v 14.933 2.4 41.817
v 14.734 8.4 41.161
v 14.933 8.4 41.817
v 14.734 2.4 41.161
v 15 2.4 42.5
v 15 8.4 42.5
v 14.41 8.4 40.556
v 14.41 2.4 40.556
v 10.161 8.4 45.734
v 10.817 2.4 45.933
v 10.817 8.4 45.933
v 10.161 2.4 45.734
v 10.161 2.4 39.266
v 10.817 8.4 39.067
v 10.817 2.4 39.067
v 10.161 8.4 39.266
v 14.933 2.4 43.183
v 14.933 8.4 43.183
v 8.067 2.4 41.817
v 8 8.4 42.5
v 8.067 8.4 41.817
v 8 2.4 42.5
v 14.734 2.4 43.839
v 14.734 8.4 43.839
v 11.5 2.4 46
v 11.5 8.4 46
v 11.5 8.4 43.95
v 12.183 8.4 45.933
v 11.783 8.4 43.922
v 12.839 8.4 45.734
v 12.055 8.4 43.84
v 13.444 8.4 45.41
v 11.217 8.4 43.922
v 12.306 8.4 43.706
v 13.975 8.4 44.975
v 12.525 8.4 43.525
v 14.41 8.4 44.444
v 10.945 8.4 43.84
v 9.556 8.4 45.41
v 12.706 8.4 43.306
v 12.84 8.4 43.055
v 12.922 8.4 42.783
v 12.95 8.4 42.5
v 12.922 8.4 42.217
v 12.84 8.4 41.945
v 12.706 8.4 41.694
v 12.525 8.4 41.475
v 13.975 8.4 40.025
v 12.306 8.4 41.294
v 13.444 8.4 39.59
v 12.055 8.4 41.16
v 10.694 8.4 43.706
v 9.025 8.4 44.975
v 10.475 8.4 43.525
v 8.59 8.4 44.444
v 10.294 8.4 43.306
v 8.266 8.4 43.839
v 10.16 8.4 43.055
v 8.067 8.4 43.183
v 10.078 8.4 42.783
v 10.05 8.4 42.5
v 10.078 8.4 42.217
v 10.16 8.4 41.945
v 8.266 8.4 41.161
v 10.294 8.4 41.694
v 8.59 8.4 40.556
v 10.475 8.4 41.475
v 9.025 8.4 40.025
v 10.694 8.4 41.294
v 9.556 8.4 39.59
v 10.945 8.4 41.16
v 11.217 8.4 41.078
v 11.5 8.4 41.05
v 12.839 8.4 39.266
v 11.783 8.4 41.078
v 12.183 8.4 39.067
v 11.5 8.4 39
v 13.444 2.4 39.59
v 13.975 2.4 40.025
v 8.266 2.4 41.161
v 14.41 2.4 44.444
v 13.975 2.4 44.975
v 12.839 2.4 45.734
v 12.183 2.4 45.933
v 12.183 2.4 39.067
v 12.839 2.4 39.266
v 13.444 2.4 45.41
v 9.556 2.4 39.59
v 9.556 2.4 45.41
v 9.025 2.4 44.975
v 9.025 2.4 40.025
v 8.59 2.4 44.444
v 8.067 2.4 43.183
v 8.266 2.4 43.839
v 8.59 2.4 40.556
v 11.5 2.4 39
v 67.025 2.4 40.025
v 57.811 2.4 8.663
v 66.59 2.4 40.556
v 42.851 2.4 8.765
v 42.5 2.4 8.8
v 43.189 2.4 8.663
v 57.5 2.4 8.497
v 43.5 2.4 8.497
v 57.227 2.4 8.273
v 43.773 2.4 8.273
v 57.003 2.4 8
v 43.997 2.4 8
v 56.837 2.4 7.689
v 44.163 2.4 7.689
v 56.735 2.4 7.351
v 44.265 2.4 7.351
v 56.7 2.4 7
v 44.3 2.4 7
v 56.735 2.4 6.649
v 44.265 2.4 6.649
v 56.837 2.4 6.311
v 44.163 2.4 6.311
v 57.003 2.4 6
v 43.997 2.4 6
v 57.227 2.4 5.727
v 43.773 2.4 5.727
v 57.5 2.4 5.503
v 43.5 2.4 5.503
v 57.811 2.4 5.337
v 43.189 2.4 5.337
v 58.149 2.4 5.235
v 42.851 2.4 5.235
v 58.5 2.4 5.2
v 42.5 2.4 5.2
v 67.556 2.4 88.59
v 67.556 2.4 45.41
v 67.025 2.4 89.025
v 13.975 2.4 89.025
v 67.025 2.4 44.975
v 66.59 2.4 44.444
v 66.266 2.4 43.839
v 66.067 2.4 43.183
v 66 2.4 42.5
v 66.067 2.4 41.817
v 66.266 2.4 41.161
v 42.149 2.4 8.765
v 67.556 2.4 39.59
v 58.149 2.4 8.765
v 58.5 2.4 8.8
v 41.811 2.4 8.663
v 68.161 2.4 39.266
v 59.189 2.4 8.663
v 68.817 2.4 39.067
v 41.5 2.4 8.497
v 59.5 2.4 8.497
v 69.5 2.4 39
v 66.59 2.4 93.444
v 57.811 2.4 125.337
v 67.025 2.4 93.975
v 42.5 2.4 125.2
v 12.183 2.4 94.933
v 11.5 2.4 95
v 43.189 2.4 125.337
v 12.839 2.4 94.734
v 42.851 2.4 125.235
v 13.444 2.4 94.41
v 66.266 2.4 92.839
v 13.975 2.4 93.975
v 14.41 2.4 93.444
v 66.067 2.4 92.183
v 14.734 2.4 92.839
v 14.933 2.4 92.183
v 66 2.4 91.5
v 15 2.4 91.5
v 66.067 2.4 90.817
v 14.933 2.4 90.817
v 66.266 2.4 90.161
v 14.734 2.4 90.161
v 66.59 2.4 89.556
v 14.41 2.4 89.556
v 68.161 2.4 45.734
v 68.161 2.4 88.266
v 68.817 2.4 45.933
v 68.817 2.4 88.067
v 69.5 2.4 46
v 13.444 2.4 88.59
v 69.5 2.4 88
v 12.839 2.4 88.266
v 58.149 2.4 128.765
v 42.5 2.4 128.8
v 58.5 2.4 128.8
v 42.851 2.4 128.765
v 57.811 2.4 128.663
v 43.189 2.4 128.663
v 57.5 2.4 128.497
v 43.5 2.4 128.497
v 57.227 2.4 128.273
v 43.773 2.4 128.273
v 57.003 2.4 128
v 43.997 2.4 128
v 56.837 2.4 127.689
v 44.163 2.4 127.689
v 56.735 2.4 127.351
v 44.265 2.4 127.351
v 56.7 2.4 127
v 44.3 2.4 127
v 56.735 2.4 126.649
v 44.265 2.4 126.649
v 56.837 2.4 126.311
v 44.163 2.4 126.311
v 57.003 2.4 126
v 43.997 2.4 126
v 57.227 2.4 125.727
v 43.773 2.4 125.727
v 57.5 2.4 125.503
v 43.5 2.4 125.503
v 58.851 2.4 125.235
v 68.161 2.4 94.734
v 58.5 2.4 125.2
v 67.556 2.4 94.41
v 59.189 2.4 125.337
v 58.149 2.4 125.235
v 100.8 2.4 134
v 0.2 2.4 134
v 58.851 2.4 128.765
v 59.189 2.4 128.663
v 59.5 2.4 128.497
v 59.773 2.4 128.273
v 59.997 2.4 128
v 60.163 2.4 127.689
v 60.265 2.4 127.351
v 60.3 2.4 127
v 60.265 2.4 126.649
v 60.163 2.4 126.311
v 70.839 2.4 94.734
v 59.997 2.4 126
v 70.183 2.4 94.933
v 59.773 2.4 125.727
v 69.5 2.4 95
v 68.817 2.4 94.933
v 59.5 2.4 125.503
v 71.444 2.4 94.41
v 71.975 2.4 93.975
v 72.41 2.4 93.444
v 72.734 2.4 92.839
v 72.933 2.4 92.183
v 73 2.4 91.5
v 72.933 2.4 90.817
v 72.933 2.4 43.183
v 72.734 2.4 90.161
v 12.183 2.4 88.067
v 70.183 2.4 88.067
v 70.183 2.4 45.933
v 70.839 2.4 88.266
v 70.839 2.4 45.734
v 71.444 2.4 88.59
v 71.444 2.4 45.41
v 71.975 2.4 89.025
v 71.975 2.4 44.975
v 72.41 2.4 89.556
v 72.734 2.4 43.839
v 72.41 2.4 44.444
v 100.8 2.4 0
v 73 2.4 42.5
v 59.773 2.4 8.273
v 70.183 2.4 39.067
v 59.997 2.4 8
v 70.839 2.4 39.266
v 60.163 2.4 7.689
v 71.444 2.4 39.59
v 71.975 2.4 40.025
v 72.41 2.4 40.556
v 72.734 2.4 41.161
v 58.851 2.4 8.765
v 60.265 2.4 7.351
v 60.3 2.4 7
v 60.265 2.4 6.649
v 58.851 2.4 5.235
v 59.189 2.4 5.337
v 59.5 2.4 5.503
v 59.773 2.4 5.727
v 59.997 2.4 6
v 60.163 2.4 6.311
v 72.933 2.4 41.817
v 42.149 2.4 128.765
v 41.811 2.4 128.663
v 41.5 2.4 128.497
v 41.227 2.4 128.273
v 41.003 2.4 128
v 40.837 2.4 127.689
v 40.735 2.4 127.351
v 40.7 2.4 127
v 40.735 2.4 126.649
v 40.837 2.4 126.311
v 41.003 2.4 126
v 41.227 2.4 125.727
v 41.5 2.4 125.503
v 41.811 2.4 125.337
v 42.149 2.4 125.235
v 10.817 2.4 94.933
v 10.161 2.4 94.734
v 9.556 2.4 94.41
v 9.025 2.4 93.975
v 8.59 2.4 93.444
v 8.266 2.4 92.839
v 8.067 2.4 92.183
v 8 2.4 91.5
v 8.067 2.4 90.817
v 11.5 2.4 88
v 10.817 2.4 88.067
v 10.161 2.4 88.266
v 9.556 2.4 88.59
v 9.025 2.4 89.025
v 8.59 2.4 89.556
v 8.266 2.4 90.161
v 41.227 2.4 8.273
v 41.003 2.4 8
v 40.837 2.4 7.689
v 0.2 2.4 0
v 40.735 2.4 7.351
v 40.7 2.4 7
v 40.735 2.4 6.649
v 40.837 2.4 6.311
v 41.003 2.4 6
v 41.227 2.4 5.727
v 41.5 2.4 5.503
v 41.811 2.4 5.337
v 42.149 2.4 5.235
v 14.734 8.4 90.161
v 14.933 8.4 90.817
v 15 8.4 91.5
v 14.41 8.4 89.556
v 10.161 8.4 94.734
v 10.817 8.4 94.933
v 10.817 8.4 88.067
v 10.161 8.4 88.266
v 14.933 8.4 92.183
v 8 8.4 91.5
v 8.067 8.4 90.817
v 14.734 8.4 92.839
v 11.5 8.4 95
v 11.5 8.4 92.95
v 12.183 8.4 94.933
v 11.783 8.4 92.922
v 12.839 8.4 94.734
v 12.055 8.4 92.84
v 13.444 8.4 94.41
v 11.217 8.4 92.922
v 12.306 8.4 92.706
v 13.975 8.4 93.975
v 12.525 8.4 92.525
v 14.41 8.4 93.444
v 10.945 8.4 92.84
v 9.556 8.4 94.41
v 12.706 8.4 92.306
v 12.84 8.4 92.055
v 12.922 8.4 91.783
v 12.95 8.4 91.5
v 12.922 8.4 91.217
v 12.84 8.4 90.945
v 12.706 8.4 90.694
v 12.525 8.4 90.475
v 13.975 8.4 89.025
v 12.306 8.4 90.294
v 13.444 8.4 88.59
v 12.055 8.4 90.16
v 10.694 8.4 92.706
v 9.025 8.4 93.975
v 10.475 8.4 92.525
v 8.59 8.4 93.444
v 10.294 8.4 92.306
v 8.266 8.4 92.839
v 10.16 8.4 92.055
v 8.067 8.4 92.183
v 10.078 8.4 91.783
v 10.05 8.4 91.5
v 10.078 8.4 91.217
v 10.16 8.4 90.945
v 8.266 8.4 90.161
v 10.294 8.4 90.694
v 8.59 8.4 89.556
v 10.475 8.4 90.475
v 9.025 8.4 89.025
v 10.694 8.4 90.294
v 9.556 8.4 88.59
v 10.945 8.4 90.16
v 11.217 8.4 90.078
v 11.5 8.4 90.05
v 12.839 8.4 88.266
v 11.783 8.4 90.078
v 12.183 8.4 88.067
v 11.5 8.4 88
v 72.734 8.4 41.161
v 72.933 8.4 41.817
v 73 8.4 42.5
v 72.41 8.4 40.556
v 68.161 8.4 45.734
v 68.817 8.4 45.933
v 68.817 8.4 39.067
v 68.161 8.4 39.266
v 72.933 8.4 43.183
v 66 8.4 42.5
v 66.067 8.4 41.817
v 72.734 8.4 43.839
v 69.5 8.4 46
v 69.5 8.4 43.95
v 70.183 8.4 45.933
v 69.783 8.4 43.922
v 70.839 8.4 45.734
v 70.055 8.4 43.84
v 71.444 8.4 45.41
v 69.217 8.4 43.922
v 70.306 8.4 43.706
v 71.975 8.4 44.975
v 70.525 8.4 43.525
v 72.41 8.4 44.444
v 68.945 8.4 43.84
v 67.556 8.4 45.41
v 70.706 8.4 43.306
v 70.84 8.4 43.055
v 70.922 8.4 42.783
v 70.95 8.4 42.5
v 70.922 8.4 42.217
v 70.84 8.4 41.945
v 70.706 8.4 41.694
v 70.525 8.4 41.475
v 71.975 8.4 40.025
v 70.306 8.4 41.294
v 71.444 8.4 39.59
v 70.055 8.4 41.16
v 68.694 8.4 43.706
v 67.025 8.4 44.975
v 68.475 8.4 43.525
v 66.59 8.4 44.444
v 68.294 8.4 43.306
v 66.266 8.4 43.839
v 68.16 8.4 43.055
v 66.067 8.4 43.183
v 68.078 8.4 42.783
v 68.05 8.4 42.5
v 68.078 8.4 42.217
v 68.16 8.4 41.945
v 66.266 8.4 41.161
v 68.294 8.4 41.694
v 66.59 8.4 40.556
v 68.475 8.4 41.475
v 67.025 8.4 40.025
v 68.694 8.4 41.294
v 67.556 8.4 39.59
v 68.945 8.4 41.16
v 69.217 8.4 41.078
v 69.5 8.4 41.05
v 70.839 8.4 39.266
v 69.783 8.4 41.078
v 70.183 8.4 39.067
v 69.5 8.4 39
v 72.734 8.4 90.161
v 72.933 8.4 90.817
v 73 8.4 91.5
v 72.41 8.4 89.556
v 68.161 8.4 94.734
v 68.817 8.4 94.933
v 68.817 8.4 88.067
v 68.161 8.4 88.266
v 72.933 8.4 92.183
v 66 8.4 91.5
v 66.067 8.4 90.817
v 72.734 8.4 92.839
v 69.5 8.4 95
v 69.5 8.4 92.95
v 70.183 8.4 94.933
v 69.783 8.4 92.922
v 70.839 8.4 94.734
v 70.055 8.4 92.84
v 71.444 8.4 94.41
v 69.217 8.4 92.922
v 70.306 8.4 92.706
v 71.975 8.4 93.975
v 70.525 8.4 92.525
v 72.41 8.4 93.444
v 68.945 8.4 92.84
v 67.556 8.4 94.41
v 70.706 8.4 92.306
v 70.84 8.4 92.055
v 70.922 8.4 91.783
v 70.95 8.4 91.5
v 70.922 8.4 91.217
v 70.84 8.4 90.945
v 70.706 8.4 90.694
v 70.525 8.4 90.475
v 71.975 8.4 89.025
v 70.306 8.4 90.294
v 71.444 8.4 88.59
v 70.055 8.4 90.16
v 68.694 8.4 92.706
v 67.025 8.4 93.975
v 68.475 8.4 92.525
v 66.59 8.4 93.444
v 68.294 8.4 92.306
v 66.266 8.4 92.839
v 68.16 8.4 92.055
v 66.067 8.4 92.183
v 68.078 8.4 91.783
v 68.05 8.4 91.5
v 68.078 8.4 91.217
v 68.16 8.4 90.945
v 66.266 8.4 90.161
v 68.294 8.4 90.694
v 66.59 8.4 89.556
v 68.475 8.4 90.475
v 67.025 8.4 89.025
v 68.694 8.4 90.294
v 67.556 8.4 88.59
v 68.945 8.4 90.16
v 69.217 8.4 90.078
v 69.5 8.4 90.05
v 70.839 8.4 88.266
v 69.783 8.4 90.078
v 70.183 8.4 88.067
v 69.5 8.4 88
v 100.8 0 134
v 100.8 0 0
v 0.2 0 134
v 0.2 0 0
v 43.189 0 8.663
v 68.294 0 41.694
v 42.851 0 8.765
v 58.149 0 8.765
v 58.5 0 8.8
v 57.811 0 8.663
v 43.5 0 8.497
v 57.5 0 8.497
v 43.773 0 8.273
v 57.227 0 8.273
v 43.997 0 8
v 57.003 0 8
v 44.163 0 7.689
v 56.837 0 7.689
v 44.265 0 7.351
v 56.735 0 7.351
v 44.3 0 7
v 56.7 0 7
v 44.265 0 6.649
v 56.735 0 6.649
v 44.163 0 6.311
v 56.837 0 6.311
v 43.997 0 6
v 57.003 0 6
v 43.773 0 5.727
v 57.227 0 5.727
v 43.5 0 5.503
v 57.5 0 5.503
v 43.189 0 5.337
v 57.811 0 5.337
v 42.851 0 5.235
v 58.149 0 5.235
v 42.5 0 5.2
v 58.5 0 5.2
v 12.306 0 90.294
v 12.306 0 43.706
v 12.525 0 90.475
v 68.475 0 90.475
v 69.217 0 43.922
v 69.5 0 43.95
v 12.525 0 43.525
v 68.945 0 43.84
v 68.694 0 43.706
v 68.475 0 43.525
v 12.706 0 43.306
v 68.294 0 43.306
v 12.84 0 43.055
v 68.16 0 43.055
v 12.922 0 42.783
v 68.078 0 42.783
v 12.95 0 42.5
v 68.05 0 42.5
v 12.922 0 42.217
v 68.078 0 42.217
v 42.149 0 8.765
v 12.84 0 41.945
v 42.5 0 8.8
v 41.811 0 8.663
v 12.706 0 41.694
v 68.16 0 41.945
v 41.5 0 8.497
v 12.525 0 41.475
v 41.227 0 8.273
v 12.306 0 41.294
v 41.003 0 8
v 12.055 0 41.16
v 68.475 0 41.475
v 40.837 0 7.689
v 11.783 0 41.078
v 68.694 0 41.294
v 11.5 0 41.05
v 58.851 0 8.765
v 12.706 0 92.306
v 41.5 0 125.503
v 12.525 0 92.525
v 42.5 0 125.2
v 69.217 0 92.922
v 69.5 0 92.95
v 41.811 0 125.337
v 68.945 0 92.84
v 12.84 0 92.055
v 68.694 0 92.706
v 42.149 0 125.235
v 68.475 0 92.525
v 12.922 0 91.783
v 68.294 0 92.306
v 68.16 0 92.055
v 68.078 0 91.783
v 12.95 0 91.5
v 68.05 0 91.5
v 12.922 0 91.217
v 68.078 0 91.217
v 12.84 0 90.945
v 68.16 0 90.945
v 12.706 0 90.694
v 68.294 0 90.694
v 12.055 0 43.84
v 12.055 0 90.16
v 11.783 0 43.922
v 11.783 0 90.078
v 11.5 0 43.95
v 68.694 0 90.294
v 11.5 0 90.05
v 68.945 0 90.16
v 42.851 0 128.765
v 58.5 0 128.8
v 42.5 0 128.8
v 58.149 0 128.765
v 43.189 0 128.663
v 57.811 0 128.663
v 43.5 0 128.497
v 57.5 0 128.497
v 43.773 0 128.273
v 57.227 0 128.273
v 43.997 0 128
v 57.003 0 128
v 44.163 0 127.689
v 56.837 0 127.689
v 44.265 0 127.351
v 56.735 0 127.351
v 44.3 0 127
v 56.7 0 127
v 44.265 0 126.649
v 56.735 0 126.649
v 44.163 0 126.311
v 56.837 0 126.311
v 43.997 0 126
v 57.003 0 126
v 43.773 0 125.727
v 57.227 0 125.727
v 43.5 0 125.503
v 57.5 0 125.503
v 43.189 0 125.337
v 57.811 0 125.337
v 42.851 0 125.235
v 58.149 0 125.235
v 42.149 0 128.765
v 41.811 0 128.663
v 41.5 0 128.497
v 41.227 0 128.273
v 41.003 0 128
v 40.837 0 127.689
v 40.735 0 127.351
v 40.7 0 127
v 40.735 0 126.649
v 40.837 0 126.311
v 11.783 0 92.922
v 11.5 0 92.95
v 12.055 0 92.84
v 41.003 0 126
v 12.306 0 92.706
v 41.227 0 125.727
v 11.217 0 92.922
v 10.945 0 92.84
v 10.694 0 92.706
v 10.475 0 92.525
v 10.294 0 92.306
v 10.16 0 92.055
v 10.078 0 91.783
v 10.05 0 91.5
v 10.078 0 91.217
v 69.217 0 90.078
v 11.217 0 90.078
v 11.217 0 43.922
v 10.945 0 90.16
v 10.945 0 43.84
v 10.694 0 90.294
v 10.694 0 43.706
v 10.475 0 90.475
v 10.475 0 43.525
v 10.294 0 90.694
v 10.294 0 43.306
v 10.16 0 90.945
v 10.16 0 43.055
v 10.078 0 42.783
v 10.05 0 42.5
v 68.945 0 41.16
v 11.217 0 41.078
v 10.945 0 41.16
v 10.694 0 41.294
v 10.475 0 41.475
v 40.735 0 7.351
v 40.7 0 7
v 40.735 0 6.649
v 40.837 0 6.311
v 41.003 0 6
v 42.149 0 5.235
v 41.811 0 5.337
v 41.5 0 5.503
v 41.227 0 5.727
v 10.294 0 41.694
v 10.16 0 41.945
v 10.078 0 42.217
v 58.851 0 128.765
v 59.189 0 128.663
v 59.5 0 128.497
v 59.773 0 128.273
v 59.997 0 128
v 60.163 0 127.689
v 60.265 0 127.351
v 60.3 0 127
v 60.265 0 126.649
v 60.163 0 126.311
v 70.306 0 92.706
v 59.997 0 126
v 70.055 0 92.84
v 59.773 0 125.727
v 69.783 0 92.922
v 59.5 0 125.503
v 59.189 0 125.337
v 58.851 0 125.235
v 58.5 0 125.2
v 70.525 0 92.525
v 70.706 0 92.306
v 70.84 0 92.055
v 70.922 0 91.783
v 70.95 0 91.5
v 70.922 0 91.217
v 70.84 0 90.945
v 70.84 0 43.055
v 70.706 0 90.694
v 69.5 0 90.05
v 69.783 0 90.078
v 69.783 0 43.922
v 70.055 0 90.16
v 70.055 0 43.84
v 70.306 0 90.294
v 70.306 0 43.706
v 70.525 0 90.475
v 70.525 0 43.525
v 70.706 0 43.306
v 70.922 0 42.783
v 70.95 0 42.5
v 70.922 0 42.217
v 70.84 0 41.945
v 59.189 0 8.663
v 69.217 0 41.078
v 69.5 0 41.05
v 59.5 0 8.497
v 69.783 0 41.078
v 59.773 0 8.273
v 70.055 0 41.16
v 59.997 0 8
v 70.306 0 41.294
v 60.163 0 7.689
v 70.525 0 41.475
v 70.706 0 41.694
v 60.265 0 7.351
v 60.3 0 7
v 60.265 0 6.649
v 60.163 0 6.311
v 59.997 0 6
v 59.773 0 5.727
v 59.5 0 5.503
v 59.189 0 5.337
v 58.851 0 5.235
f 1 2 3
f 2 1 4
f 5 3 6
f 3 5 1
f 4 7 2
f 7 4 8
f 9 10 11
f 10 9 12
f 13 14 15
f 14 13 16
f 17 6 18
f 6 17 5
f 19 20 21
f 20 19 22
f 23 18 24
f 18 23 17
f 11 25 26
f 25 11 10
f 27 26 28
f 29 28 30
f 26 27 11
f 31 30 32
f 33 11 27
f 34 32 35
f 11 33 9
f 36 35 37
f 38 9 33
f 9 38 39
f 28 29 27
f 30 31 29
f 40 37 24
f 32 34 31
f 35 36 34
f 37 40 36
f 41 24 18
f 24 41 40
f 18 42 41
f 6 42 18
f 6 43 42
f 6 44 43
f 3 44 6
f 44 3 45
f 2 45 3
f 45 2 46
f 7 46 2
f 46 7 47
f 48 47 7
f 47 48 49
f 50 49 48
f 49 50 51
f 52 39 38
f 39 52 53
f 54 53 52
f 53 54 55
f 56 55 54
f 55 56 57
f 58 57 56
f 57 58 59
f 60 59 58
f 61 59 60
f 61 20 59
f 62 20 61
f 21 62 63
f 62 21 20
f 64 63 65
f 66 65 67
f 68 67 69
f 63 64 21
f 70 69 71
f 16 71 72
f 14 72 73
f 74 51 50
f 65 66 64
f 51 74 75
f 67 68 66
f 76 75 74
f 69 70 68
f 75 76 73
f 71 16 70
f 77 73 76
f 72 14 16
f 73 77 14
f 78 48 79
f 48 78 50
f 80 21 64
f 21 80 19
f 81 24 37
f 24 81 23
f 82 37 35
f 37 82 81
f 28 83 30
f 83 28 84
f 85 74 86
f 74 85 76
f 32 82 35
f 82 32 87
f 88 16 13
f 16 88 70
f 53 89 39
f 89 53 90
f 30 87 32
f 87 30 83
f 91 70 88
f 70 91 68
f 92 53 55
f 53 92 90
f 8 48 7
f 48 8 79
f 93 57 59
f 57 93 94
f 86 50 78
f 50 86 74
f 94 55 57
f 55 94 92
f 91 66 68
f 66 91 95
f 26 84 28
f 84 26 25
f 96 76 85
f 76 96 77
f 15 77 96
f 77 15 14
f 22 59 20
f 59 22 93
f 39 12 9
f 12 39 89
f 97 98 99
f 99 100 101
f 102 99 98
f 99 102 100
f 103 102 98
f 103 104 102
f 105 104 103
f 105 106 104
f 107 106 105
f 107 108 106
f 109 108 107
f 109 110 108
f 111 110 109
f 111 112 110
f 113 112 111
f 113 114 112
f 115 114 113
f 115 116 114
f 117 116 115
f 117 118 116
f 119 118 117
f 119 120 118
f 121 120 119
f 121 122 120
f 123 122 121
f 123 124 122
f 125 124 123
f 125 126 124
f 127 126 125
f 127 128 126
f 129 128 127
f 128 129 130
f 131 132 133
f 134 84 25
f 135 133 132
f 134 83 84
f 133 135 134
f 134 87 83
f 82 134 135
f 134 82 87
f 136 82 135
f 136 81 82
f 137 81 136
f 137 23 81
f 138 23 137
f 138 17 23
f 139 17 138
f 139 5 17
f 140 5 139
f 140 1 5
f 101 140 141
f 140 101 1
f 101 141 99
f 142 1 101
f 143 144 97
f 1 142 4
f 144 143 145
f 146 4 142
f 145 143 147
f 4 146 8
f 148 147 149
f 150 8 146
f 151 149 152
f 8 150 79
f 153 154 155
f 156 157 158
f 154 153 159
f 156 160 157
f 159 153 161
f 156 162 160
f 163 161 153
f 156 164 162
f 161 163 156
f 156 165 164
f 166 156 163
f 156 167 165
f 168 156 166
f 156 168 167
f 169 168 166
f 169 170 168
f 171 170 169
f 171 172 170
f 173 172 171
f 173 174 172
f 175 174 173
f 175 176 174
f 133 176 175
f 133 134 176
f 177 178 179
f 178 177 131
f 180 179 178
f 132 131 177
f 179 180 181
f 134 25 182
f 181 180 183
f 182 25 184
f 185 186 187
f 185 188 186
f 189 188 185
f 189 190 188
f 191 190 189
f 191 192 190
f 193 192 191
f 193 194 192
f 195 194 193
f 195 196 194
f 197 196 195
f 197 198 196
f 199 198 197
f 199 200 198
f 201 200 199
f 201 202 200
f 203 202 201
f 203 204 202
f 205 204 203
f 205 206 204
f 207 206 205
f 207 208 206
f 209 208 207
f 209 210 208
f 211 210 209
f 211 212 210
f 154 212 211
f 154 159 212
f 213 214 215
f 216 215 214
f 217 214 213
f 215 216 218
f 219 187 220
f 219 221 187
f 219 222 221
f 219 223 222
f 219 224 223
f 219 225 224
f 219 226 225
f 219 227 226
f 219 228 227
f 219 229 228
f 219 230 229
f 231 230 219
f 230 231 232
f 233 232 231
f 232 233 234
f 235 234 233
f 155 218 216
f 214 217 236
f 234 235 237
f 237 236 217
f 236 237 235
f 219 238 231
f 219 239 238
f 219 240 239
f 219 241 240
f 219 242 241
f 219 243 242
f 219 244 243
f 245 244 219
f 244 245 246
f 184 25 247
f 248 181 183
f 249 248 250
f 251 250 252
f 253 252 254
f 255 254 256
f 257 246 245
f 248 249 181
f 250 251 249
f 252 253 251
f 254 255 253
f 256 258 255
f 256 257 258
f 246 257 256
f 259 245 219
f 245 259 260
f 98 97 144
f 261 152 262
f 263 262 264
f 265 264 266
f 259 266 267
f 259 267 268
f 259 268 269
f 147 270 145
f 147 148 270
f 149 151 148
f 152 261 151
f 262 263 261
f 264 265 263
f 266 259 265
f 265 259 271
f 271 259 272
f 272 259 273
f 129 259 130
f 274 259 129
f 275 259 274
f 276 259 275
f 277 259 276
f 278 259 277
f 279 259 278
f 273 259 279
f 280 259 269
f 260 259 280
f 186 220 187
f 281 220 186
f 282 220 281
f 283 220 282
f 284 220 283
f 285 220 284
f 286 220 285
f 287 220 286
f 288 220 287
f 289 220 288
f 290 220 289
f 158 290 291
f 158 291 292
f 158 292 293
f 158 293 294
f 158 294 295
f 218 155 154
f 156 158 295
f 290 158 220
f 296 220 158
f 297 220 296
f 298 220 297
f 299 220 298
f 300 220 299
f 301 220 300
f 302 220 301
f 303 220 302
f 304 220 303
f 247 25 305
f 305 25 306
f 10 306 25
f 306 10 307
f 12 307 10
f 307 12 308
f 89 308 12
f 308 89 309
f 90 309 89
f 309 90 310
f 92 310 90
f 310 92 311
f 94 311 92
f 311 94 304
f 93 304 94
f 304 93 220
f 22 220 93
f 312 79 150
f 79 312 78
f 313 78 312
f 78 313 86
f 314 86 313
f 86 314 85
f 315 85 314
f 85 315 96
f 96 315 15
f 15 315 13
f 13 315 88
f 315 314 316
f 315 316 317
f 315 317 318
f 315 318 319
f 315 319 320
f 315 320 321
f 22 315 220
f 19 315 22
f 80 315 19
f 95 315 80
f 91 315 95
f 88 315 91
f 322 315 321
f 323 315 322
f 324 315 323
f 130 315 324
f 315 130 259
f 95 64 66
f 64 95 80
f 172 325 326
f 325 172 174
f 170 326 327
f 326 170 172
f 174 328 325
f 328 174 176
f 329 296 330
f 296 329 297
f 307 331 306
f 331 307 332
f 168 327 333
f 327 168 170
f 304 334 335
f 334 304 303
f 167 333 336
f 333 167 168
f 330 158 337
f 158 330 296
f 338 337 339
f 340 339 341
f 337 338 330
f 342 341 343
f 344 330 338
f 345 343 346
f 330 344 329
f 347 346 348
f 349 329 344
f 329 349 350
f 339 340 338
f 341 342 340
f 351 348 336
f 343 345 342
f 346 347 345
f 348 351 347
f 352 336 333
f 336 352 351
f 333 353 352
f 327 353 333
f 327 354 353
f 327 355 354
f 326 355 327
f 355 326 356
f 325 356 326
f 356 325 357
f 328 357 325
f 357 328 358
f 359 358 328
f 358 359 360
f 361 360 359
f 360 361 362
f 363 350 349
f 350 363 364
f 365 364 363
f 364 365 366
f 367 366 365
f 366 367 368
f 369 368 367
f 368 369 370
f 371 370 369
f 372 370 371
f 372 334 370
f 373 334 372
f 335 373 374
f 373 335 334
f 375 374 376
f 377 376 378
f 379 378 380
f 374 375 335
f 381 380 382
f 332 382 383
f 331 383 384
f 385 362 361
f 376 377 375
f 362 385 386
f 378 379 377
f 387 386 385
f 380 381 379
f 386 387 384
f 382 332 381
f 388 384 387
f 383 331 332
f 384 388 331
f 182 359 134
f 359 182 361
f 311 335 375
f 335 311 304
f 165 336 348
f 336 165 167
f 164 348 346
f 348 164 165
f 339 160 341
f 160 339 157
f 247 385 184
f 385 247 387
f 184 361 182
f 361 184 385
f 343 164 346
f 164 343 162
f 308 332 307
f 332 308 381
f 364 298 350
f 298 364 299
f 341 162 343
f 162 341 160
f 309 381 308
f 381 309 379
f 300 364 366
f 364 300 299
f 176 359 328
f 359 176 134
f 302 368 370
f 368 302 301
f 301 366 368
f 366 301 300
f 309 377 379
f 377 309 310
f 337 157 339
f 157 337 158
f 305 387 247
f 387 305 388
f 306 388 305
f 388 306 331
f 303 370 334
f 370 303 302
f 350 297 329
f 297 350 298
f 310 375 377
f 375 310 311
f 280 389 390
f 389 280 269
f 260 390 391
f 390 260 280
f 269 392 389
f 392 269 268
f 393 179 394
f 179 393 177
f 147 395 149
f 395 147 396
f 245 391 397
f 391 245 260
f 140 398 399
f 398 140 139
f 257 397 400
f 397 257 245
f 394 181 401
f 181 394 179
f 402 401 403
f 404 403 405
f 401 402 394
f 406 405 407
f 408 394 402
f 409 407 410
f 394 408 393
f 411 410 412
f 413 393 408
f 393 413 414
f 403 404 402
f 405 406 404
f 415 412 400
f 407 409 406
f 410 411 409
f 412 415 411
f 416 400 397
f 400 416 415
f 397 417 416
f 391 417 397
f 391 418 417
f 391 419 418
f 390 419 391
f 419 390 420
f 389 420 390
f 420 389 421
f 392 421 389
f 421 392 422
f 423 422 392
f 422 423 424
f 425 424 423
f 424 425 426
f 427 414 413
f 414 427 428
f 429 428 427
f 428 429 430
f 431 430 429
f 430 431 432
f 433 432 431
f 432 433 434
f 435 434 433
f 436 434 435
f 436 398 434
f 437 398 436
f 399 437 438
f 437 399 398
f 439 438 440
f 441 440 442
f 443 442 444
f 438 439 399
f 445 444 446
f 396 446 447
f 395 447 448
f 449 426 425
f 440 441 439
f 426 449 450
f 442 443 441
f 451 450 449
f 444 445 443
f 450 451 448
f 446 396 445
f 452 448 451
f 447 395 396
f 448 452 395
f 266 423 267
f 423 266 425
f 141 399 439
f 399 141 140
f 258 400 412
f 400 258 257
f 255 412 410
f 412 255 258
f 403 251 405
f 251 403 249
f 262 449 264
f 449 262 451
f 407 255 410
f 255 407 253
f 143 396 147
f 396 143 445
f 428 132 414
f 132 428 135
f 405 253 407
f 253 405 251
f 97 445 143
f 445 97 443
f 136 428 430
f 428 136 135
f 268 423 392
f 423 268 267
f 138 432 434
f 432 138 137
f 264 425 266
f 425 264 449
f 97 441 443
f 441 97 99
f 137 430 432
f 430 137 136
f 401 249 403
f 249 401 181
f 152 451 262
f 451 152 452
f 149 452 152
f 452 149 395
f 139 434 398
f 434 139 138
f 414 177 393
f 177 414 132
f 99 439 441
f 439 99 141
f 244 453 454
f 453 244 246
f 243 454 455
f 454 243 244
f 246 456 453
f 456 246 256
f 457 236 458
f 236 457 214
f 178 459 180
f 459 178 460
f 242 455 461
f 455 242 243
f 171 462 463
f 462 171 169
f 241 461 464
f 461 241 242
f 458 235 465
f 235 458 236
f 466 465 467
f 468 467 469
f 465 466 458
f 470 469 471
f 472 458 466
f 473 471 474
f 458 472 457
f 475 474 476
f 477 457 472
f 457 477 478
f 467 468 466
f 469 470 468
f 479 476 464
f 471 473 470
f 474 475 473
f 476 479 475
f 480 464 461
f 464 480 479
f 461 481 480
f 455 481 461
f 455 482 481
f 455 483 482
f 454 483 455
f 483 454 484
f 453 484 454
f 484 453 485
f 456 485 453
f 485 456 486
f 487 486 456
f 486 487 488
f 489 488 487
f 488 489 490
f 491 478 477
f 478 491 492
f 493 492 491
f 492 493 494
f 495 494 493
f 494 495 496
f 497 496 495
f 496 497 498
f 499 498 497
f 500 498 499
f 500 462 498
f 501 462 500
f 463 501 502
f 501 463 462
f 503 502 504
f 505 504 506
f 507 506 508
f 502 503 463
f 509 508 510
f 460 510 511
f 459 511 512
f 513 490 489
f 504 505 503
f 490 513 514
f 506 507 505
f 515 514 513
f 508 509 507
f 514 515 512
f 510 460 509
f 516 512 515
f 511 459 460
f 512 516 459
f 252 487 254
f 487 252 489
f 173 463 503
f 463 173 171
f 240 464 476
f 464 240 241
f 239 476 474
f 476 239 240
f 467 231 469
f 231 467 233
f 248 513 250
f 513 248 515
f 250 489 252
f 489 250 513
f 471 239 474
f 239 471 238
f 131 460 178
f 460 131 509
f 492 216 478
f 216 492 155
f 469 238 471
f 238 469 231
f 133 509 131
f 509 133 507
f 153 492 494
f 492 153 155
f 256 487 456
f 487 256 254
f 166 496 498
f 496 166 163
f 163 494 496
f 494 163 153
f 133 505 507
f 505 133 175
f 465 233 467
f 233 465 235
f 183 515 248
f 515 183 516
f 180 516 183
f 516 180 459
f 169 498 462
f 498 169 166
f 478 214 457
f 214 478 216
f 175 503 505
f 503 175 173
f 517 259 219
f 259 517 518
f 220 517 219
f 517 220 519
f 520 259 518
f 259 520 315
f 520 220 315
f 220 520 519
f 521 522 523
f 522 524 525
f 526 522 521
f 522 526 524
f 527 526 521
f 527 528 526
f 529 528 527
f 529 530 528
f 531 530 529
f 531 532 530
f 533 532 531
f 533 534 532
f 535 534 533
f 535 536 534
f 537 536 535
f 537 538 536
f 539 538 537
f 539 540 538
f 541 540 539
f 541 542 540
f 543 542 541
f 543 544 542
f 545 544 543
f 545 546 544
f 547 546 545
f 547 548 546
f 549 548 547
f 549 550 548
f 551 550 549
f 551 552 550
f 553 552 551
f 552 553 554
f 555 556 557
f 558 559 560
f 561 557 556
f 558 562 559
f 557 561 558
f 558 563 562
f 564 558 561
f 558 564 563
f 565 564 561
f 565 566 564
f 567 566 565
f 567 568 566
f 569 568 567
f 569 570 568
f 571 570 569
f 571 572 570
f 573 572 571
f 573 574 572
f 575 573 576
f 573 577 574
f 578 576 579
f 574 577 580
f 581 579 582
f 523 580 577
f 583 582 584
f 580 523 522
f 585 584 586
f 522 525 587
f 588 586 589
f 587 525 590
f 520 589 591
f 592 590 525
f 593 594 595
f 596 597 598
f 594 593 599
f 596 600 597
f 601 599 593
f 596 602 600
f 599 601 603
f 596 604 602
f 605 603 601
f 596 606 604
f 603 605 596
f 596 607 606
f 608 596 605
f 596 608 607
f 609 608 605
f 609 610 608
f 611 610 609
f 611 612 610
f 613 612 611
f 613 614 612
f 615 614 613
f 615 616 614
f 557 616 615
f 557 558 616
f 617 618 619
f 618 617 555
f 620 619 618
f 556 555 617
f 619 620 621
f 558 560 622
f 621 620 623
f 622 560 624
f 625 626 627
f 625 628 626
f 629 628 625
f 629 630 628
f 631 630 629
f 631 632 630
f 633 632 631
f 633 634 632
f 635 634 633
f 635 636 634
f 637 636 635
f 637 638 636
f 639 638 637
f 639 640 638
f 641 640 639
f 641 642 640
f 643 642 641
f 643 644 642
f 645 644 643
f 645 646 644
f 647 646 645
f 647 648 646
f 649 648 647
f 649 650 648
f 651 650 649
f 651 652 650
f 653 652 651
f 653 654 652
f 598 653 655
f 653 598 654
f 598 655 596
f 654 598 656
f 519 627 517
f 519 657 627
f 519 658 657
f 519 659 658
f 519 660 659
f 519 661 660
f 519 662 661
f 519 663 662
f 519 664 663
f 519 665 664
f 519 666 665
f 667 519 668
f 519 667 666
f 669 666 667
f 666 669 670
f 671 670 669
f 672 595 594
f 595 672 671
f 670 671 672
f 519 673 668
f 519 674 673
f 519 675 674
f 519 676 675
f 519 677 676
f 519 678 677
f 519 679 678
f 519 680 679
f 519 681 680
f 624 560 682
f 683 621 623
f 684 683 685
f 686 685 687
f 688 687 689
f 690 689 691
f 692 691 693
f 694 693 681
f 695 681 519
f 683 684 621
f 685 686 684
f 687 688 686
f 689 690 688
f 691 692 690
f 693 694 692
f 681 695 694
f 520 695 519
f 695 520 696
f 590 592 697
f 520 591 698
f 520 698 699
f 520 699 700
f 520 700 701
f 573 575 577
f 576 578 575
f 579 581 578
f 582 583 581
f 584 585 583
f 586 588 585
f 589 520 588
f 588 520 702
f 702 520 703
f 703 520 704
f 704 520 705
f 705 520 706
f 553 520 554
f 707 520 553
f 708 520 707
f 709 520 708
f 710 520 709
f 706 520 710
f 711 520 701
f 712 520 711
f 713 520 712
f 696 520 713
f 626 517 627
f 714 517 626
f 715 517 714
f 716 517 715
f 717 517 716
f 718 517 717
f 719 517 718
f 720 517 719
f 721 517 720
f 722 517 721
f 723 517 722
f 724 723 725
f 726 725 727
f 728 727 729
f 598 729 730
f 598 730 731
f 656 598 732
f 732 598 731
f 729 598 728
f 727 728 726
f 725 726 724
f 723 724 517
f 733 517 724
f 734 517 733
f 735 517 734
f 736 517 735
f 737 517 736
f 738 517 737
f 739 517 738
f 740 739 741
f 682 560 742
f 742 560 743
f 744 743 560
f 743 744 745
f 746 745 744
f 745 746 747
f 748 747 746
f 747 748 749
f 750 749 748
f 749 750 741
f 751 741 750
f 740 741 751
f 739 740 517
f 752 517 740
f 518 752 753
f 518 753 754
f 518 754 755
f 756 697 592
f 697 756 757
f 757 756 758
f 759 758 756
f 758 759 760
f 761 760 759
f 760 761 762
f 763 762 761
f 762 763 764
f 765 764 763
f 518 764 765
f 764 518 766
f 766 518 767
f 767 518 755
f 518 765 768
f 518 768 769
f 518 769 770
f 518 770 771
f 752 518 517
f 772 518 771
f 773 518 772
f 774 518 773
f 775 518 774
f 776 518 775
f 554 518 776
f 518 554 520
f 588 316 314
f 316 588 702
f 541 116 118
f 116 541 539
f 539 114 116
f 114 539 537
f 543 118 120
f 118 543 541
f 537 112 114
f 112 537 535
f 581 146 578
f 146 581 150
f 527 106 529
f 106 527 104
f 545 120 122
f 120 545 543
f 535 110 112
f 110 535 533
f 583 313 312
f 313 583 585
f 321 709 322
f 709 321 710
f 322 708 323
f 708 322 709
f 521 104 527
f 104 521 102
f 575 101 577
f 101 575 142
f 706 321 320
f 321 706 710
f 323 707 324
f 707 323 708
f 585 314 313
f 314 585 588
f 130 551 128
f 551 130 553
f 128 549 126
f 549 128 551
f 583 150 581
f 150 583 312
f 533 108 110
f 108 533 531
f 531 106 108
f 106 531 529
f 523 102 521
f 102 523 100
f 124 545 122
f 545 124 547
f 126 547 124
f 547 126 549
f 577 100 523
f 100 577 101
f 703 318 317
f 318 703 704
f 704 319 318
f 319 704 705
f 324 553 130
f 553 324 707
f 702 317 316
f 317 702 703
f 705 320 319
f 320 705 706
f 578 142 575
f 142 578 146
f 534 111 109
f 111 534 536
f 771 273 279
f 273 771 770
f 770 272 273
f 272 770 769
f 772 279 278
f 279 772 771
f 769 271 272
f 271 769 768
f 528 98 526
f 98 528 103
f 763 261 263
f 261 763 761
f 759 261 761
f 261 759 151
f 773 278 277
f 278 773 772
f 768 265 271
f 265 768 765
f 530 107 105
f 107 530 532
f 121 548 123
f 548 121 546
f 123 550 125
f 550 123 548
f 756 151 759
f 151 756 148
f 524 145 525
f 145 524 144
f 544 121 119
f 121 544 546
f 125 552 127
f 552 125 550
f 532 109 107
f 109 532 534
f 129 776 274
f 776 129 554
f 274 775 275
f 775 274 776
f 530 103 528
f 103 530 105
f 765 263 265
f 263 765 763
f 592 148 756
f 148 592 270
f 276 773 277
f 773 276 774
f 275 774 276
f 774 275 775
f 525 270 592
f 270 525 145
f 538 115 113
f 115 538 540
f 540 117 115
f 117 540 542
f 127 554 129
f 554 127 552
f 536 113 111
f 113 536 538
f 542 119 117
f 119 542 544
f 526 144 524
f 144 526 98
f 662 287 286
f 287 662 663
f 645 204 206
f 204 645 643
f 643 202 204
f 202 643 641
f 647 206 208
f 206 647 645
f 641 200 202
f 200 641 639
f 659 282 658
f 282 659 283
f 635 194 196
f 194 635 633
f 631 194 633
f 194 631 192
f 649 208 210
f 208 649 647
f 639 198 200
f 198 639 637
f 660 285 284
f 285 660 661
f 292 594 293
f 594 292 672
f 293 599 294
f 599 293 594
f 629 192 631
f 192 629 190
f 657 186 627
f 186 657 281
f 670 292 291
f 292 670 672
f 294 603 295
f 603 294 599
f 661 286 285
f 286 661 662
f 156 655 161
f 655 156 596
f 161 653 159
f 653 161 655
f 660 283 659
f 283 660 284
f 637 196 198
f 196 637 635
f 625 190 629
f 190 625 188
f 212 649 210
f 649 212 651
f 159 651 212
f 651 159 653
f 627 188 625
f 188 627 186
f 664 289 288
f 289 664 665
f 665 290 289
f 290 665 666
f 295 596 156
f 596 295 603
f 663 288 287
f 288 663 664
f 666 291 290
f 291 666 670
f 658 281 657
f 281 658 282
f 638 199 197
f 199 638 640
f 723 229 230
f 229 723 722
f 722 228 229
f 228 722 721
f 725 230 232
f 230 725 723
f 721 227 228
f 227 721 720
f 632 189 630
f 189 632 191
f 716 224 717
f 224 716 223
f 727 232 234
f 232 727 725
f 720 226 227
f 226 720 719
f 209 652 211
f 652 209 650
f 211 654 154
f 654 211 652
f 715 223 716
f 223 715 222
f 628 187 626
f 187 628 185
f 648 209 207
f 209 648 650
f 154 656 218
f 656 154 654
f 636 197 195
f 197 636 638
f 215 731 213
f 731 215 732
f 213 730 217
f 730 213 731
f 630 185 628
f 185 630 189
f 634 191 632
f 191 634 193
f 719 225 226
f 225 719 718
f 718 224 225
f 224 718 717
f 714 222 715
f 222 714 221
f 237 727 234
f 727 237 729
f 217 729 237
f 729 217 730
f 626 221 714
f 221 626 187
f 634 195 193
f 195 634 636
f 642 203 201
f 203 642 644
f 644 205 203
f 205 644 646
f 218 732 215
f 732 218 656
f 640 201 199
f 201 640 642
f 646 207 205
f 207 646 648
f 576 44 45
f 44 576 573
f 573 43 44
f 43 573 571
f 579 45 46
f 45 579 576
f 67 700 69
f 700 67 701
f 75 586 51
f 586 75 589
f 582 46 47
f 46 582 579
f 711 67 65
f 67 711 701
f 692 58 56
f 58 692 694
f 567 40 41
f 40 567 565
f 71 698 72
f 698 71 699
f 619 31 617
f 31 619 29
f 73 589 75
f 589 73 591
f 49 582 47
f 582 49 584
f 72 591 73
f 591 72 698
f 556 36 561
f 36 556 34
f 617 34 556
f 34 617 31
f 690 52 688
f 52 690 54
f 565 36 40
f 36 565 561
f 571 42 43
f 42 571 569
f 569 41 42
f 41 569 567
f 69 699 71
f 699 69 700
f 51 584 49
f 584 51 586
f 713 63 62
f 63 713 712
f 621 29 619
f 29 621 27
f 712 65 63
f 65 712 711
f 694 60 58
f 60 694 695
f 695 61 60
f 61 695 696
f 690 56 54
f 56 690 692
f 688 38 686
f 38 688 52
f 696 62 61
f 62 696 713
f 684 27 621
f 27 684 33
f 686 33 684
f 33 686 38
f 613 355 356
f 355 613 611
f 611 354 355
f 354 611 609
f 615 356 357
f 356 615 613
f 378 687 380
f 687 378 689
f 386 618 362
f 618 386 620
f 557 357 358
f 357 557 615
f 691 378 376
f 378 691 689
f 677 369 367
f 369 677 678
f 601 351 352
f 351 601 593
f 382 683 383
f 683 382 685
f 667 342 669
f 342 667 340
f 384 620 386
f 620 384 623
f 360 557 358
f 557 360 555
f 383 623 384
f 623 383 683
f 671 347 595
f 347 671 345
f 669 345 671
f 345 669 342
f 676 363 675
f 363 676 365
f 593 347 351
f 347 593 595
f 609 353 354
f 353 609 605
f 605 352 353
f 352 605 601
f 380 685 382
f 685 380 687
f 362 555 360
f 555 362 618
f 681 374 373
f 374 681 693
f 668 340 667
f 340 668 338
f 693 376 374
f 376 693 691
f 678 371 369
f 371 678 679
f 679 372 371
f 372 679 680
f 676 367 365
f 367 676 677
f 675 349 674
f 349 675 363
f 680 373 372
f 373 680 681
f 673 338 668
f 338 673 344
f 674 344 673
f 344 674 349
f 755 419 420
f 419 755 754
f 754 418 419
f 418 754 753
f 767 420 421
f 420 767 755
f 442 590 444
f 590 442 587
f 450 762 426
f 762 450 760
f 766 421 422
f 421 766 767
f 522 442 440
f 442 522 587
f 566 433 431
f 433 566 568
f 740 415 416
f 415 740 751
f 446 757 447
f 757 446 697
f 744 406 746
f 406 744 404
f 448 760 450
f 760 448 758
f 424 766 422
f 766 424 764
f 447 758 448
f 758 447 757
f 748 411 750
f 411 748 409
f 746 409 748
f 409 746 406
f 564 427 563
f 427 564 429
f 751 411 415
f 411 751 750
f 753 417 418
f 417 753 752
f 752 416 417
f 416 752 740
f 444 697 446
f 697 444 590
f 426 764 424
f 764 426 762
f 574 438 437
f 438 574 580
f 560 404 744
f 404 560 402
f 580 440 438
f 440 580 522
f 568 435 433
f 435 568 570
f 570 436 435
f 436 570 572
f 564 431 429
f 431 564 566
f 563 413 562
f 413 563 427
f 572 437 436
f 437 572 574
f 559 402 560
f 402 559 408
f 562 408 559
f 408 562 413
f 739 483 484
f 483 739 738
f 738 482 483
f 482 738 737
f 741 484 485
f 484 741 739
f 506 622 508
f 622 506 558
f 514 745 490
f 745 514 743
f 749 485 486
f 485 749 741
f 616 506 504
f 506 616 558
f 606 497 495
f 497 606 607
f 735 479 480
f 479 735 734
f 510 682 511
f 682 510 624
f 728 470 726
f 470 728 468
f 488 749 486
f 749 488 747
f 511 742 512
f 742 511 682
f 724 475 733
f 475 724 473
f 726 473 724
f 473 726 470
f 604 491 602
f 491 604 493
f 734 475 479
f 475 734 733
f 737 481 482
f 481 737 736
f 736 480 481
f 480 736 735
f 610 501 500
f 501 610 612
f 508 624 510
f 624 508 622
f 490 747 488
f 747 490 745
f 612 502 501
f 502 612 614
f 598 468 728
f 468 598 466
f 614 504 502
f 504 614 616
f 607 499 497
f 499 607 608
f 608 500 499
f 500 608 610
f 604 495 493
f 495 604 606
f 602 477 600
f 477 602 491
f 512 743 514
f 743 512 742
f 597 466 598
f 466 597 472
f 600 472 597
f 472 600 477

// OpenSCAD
// file: ../params.scad
// Общие размеры первой итерации: один отсек 3.5" и детали вокруг него.
// Корпус диска — SFF-8301, таблица 3-1, класс высоты 26.10 мм (максимум).
// Положение разъёма SATA сюда не зашито: его снимают калибром gauge.scad
// с конкретного диска и только потом переносят в окно салазок.

drive_width = 101.60;
drive_height = 26.10;
drive_length = 147.00;

wall = 4.0;
floor_t = 4.0;
lip_t = 3.0;
nib = 4.0;
side_clearance = 0.8;
top_clearance = 1.5;

front_gap = 3.0;
plate_t = 8.0;
front_extra = front_gap + plate_t;

pusher_d = 4.4;
m3_clear = 3.4;
m3_pilot = 2.6;
m3_nut_af = 5.5;
m3_nut_t = 2.8;

cavity_w = drive_width + side_clearance;
outer_w = cavity_w + 2 * wall;
wall_h = drive_height + top_clearance;
body_z = drive_length + front_extra;

strap_z = 18;
strap_t = 4.0;
strap_foot = 14.0;

plate_screw_x = [14, drive_width - 14];
plate_z0 = drive_length + front_gap;
plate_screw_z = plate_z0 + plate_t / 2;
plate_bar_h = 10;
tower_w = 28;
tower_x = drive_width / 2 - tower_w / 2;

sled_w = 78;
sled_h = 48;
sled_t = 8;
sled_window_w = 50;
sled_window_h = 18;
sled_hole_inset = 6;

// Каркас 1U. Шаг EIA — 44.45 мм, уголок 44.0 мм, чтобы соседний юнит не тёрся.
// Гнездо 8.4 мм принимает трубку до 8 мм. Хомут тянет её к внешней стенке гнезда.
// При rod_d = 6 между трубками 29 мм: пол корзины 1.6 мм, диск 26.1 мм, воздух ~1 мм.
// При 8 мм диск 26.1 мм в этот юнит уже не входит.
unit_h = 44.0;
rod_d = 6;
socket_d = 8.4;
// 10 мм хватает, чтобы трубка села и хомут её зажал. Столбик тогда 12 мм,
// и четыре корзины остаются внутри просвета 450 мм.
socket_depth = 10;
socket_wall = 1.6;
skin = 0.8;
foot = 1.6;
roof = 1.4;
tie_w = 3.2;
// Просвет между направляющими стойки 19 дюймов — 450 мм.
opening_w = 450;
bay_count = 4;
bay_gap = 1.0;
basket_wall = 1.6;
basket_clear = 0.6;
rail_t = 1.6;
// Торец разъёма выступает за ближнюю трубку к каретке, чтобы трубка не перекрыла SATA.
plug_overhang = 16;
stop_margin = 14;

socket_r = socket_d / 2;
post_x = socket_depth + 2;
axis_inset = skin + socket_r;
bottom_axis_y = foot + socket_r;
top_axis_y = unit_h - roof - socket_r;
depth_z0 = axis_inset + socket_r + socket_wall;
post_z = depth_z0 + socket_depth;
basket_w = drive_width + basket_clear + 2 * basket_wall;
inner_w = bay_count * basket_w + (bay_count - 1) * bay_gap;
frame_w = inner_w + 2 * post_x;
rod_span = drive_length - plug_overhang + stop_margin;
frame_depth = rod_span + 2 * axis_inset;
rod_y0 = foot + rod_d / 2;
rod_y1 = unit_h - roof - rod_d / 2;
rod_gap = (rod_y1 - rod_d / 2) - (rod_y0 + rod_d / 2);

// KW11-3Z: корпус около 19.8 x 10.2 x 6.4 мм, два отверстия 2.35–2.5 мм
// с шагом 9.5 мм под винты M2.
switch_hole_d = 2.5;
switch_pitch = 9.5;

$fn = 32;
// file: params.scad
// Наборный ярус. Стоит рядом с cad/rack.scad и ту стойку не заменяет.
// Диск, юнит, гнездо 8.4 мм и ширина четырёх отсеков — из ../params.scad.
// Здесь их не копируют: если правка там, ярус подхватит её сам.
include <../params.scad>

$fn = 32;

// Сборка на трубке 6 мм. Гнездо принимает и 8 мм, но тогда диск 26.1 мм
// в юнит 44 мм уже не входит: между трубками остаётся около 29 мм.
m4_clear = 4.4;
board_t = 1.6;
standoff_h = 6;
comp_max = 10;
tray_t = 2.4;
tie_hole = 3.6;

// Плата Pi 4: 85 × 56 мм. Отверстия Ø2.7 под M2.5, шаг 58 × 49,
// отступ 3.5 от левого края и от обеих кромок стороны 56 мм.
// Чертёж Raspberry Pi Ltd RP-008343-DS-1. В пластике проход 2.9 мм.
// https://pip-assets.raspberrypi.com/categories/545-raspberry-pi-4-model-b/documents/RP-008343-DS-1-raspberry-pi-4-mechanical-drawing.pdf
pi_l = 85;
pi_w = 56;
pi_hole_d = 2.9;
pi_pitch_x = 58;
pi_pitch_y = 49;
pi_inset = 3.5;

sata_l = 100;
sata_w = 80;
ctrl_l = 100;
ctrl_w = 100;

// Шпилька M4 не встаёт рядом с гнездом в столбике 12 мм,
// а столбик шире раздвигает каркас за просвет 450 мм.
// Поэтому колодец шпильки — в переднем блоке, гнёзда за ним по глубине.
rod_hole_x = post_x / 2;
rod_hole_z = 5;
socket_gap = 1.6;

width_axis_z = rod_hole_z + m4_clear / 2 + socket_gap + socket_r;
depth_bore_z = width_axis_z + socket_r + socket_gap;
stack_post_z = depth_bore_z + socket_depth;
depth_axis_x = post_x / 2;

// Ложемент. Его z = 0 — передний край ушка.
ear_past = rod_d / 2 + 4;
cradle_lip_t = 2.4;
cradle_cheek_t = 2.4;
cradle_cheek = 4;
cradle_gap_tube = 1.0;
cradle_rear_inset = 22;
cradle_lip_h = 8;

cradle_z_front = ear_past;
cradle_z_drive0 = cradle_z_front + rod_d / 2 + cradle_gap_tube + cradle_lip_t;
cradle_z_drive1 = cradle_z_drive0 + drive_length;
cradle_z_rear = cradle_z_drive1 - cradle_rear_inset;
cradle_z_end = cradle_z_drive1 + cradle_cheek_t;

// Передняя трубка яруса совпадает с гнездом уголка.
cradle_z0 = width_axis_z - cradle_z_front;
drive_z0 = cradle_z0 + cradle_z_drive0;
drive_z1 = cradle_z0 + cradle_z_drive1;
mid_rail_z = cradle_z0 + cradle_z_rear;
cradle_y = rod_y0 + rod_d / 2;

// Задний отсек: кабели и платы лёжа. Договор просит не меньше 90 мм.
// Контрольная плата 100 мм, поэтому между осями трубок лотка 120 мм.
cable_gap = 36;
tray_span = 120;
bay_rail_z = drive_z1 + cable_gap;
rear_width_z = bay_rail_z + tray_span;
stack_depth = rear_width_z + width_axis_z;
tray_len = tray_span + 2 * ear_past;
tray_z0 = bay_rail_z - ear_past;

width_tube_len = frame_w - 2 * (post_x - socket_depth);
depth_tube_len = stack_depth - 2 * depth_bore_z;
rail_end_gap = 0.4;
rail_x0 = depth_axis_x + rod_d / 2 + rail_end_gap;
cross_tube_len = frame_w - 2 * rail_x0;

// Хомут рельса. Оси локальные, сборка совмещает их с трубками.
clamp_dx = 10;
clamp_cz = 12;

stud_extra = 16;
ear_out = 16;
ear_t = 3.2;

sata_tray_w = sata_l + 16;
ctrl_tray_w = ctrl_l + 16;
pi_tray_w = pi_l + 16;

bay_clear = (rear_width_z - rod_d / 2) - drive_z1;
board_stack = tray_t + standoff_h + board_t + comp_max;
// main file
// Плита Raspberry Pi 4. Только первый ярус. Плитой вниз, бобышки вверх.
// Плата 85 × 56. Отверстия по чертежу Raspberry Pi Ltd RP-008343-DS-1:
// Ø2.7 под M2.5, центры (3.5, 3.5), (61.5, 3.5), (3.5, 52.5), (61.5, 52.5)
// от угла, который напротив разъёмов USB и Ethernet. Шаг 58 × 49.
// В пластике проход 2.9 мм. Винт M2.5 сверху, гайка снизу. Стойка 6 мм.
// Разъёмы USB и Ethernet смотрят на +X, в промежуток между плитами.
include <params.scad>

module pi_plate() {
    z0 = ear_past + rod_d / 2 + ((tray_span - rod_d) - pi_w) / 2;
    x0 = (pi_tray_w - pi_l) / 2;

    difference() {
        union() {
            translate([0.2, 0, 0])
                cube([pi_tray_w - 0.4, tray_t, tray_len]);
            for (hx = [pi_inset, pi_inset + pi_pitch_x])
                for (hz = [pi_inset, pi_inset + pi_pitch_y])
                    translate([x0 + hx, tray_t, z0 + hz])
                        rotate([-90, 0, 0])
                            cylinder(h = standoff_h, d = 7);
        }

        for (z = [ear_past, ear_past + tray_span])
            for (dx = [-8, 8])
                translate([pi_tray_w / 2 + dx, -0.2, z])
                    rotate([-90, 0, 0])
                        cylinder(h = tray_t + 0.4, d = tie_hole);

        for (hx = [pi_inset, pi_inset + pi_pitch_x])
            for (hz = [pi_inset, pi_inset + pi_pitch_y])
                translate([x0 + hx, -0.2, z0 + hz])
                    rotate([-90, 0, 0])
                        cylinder(h = tray_t + standoff_h + 0.4, d = pi_hole_d);
    }
}

pi_plate();
